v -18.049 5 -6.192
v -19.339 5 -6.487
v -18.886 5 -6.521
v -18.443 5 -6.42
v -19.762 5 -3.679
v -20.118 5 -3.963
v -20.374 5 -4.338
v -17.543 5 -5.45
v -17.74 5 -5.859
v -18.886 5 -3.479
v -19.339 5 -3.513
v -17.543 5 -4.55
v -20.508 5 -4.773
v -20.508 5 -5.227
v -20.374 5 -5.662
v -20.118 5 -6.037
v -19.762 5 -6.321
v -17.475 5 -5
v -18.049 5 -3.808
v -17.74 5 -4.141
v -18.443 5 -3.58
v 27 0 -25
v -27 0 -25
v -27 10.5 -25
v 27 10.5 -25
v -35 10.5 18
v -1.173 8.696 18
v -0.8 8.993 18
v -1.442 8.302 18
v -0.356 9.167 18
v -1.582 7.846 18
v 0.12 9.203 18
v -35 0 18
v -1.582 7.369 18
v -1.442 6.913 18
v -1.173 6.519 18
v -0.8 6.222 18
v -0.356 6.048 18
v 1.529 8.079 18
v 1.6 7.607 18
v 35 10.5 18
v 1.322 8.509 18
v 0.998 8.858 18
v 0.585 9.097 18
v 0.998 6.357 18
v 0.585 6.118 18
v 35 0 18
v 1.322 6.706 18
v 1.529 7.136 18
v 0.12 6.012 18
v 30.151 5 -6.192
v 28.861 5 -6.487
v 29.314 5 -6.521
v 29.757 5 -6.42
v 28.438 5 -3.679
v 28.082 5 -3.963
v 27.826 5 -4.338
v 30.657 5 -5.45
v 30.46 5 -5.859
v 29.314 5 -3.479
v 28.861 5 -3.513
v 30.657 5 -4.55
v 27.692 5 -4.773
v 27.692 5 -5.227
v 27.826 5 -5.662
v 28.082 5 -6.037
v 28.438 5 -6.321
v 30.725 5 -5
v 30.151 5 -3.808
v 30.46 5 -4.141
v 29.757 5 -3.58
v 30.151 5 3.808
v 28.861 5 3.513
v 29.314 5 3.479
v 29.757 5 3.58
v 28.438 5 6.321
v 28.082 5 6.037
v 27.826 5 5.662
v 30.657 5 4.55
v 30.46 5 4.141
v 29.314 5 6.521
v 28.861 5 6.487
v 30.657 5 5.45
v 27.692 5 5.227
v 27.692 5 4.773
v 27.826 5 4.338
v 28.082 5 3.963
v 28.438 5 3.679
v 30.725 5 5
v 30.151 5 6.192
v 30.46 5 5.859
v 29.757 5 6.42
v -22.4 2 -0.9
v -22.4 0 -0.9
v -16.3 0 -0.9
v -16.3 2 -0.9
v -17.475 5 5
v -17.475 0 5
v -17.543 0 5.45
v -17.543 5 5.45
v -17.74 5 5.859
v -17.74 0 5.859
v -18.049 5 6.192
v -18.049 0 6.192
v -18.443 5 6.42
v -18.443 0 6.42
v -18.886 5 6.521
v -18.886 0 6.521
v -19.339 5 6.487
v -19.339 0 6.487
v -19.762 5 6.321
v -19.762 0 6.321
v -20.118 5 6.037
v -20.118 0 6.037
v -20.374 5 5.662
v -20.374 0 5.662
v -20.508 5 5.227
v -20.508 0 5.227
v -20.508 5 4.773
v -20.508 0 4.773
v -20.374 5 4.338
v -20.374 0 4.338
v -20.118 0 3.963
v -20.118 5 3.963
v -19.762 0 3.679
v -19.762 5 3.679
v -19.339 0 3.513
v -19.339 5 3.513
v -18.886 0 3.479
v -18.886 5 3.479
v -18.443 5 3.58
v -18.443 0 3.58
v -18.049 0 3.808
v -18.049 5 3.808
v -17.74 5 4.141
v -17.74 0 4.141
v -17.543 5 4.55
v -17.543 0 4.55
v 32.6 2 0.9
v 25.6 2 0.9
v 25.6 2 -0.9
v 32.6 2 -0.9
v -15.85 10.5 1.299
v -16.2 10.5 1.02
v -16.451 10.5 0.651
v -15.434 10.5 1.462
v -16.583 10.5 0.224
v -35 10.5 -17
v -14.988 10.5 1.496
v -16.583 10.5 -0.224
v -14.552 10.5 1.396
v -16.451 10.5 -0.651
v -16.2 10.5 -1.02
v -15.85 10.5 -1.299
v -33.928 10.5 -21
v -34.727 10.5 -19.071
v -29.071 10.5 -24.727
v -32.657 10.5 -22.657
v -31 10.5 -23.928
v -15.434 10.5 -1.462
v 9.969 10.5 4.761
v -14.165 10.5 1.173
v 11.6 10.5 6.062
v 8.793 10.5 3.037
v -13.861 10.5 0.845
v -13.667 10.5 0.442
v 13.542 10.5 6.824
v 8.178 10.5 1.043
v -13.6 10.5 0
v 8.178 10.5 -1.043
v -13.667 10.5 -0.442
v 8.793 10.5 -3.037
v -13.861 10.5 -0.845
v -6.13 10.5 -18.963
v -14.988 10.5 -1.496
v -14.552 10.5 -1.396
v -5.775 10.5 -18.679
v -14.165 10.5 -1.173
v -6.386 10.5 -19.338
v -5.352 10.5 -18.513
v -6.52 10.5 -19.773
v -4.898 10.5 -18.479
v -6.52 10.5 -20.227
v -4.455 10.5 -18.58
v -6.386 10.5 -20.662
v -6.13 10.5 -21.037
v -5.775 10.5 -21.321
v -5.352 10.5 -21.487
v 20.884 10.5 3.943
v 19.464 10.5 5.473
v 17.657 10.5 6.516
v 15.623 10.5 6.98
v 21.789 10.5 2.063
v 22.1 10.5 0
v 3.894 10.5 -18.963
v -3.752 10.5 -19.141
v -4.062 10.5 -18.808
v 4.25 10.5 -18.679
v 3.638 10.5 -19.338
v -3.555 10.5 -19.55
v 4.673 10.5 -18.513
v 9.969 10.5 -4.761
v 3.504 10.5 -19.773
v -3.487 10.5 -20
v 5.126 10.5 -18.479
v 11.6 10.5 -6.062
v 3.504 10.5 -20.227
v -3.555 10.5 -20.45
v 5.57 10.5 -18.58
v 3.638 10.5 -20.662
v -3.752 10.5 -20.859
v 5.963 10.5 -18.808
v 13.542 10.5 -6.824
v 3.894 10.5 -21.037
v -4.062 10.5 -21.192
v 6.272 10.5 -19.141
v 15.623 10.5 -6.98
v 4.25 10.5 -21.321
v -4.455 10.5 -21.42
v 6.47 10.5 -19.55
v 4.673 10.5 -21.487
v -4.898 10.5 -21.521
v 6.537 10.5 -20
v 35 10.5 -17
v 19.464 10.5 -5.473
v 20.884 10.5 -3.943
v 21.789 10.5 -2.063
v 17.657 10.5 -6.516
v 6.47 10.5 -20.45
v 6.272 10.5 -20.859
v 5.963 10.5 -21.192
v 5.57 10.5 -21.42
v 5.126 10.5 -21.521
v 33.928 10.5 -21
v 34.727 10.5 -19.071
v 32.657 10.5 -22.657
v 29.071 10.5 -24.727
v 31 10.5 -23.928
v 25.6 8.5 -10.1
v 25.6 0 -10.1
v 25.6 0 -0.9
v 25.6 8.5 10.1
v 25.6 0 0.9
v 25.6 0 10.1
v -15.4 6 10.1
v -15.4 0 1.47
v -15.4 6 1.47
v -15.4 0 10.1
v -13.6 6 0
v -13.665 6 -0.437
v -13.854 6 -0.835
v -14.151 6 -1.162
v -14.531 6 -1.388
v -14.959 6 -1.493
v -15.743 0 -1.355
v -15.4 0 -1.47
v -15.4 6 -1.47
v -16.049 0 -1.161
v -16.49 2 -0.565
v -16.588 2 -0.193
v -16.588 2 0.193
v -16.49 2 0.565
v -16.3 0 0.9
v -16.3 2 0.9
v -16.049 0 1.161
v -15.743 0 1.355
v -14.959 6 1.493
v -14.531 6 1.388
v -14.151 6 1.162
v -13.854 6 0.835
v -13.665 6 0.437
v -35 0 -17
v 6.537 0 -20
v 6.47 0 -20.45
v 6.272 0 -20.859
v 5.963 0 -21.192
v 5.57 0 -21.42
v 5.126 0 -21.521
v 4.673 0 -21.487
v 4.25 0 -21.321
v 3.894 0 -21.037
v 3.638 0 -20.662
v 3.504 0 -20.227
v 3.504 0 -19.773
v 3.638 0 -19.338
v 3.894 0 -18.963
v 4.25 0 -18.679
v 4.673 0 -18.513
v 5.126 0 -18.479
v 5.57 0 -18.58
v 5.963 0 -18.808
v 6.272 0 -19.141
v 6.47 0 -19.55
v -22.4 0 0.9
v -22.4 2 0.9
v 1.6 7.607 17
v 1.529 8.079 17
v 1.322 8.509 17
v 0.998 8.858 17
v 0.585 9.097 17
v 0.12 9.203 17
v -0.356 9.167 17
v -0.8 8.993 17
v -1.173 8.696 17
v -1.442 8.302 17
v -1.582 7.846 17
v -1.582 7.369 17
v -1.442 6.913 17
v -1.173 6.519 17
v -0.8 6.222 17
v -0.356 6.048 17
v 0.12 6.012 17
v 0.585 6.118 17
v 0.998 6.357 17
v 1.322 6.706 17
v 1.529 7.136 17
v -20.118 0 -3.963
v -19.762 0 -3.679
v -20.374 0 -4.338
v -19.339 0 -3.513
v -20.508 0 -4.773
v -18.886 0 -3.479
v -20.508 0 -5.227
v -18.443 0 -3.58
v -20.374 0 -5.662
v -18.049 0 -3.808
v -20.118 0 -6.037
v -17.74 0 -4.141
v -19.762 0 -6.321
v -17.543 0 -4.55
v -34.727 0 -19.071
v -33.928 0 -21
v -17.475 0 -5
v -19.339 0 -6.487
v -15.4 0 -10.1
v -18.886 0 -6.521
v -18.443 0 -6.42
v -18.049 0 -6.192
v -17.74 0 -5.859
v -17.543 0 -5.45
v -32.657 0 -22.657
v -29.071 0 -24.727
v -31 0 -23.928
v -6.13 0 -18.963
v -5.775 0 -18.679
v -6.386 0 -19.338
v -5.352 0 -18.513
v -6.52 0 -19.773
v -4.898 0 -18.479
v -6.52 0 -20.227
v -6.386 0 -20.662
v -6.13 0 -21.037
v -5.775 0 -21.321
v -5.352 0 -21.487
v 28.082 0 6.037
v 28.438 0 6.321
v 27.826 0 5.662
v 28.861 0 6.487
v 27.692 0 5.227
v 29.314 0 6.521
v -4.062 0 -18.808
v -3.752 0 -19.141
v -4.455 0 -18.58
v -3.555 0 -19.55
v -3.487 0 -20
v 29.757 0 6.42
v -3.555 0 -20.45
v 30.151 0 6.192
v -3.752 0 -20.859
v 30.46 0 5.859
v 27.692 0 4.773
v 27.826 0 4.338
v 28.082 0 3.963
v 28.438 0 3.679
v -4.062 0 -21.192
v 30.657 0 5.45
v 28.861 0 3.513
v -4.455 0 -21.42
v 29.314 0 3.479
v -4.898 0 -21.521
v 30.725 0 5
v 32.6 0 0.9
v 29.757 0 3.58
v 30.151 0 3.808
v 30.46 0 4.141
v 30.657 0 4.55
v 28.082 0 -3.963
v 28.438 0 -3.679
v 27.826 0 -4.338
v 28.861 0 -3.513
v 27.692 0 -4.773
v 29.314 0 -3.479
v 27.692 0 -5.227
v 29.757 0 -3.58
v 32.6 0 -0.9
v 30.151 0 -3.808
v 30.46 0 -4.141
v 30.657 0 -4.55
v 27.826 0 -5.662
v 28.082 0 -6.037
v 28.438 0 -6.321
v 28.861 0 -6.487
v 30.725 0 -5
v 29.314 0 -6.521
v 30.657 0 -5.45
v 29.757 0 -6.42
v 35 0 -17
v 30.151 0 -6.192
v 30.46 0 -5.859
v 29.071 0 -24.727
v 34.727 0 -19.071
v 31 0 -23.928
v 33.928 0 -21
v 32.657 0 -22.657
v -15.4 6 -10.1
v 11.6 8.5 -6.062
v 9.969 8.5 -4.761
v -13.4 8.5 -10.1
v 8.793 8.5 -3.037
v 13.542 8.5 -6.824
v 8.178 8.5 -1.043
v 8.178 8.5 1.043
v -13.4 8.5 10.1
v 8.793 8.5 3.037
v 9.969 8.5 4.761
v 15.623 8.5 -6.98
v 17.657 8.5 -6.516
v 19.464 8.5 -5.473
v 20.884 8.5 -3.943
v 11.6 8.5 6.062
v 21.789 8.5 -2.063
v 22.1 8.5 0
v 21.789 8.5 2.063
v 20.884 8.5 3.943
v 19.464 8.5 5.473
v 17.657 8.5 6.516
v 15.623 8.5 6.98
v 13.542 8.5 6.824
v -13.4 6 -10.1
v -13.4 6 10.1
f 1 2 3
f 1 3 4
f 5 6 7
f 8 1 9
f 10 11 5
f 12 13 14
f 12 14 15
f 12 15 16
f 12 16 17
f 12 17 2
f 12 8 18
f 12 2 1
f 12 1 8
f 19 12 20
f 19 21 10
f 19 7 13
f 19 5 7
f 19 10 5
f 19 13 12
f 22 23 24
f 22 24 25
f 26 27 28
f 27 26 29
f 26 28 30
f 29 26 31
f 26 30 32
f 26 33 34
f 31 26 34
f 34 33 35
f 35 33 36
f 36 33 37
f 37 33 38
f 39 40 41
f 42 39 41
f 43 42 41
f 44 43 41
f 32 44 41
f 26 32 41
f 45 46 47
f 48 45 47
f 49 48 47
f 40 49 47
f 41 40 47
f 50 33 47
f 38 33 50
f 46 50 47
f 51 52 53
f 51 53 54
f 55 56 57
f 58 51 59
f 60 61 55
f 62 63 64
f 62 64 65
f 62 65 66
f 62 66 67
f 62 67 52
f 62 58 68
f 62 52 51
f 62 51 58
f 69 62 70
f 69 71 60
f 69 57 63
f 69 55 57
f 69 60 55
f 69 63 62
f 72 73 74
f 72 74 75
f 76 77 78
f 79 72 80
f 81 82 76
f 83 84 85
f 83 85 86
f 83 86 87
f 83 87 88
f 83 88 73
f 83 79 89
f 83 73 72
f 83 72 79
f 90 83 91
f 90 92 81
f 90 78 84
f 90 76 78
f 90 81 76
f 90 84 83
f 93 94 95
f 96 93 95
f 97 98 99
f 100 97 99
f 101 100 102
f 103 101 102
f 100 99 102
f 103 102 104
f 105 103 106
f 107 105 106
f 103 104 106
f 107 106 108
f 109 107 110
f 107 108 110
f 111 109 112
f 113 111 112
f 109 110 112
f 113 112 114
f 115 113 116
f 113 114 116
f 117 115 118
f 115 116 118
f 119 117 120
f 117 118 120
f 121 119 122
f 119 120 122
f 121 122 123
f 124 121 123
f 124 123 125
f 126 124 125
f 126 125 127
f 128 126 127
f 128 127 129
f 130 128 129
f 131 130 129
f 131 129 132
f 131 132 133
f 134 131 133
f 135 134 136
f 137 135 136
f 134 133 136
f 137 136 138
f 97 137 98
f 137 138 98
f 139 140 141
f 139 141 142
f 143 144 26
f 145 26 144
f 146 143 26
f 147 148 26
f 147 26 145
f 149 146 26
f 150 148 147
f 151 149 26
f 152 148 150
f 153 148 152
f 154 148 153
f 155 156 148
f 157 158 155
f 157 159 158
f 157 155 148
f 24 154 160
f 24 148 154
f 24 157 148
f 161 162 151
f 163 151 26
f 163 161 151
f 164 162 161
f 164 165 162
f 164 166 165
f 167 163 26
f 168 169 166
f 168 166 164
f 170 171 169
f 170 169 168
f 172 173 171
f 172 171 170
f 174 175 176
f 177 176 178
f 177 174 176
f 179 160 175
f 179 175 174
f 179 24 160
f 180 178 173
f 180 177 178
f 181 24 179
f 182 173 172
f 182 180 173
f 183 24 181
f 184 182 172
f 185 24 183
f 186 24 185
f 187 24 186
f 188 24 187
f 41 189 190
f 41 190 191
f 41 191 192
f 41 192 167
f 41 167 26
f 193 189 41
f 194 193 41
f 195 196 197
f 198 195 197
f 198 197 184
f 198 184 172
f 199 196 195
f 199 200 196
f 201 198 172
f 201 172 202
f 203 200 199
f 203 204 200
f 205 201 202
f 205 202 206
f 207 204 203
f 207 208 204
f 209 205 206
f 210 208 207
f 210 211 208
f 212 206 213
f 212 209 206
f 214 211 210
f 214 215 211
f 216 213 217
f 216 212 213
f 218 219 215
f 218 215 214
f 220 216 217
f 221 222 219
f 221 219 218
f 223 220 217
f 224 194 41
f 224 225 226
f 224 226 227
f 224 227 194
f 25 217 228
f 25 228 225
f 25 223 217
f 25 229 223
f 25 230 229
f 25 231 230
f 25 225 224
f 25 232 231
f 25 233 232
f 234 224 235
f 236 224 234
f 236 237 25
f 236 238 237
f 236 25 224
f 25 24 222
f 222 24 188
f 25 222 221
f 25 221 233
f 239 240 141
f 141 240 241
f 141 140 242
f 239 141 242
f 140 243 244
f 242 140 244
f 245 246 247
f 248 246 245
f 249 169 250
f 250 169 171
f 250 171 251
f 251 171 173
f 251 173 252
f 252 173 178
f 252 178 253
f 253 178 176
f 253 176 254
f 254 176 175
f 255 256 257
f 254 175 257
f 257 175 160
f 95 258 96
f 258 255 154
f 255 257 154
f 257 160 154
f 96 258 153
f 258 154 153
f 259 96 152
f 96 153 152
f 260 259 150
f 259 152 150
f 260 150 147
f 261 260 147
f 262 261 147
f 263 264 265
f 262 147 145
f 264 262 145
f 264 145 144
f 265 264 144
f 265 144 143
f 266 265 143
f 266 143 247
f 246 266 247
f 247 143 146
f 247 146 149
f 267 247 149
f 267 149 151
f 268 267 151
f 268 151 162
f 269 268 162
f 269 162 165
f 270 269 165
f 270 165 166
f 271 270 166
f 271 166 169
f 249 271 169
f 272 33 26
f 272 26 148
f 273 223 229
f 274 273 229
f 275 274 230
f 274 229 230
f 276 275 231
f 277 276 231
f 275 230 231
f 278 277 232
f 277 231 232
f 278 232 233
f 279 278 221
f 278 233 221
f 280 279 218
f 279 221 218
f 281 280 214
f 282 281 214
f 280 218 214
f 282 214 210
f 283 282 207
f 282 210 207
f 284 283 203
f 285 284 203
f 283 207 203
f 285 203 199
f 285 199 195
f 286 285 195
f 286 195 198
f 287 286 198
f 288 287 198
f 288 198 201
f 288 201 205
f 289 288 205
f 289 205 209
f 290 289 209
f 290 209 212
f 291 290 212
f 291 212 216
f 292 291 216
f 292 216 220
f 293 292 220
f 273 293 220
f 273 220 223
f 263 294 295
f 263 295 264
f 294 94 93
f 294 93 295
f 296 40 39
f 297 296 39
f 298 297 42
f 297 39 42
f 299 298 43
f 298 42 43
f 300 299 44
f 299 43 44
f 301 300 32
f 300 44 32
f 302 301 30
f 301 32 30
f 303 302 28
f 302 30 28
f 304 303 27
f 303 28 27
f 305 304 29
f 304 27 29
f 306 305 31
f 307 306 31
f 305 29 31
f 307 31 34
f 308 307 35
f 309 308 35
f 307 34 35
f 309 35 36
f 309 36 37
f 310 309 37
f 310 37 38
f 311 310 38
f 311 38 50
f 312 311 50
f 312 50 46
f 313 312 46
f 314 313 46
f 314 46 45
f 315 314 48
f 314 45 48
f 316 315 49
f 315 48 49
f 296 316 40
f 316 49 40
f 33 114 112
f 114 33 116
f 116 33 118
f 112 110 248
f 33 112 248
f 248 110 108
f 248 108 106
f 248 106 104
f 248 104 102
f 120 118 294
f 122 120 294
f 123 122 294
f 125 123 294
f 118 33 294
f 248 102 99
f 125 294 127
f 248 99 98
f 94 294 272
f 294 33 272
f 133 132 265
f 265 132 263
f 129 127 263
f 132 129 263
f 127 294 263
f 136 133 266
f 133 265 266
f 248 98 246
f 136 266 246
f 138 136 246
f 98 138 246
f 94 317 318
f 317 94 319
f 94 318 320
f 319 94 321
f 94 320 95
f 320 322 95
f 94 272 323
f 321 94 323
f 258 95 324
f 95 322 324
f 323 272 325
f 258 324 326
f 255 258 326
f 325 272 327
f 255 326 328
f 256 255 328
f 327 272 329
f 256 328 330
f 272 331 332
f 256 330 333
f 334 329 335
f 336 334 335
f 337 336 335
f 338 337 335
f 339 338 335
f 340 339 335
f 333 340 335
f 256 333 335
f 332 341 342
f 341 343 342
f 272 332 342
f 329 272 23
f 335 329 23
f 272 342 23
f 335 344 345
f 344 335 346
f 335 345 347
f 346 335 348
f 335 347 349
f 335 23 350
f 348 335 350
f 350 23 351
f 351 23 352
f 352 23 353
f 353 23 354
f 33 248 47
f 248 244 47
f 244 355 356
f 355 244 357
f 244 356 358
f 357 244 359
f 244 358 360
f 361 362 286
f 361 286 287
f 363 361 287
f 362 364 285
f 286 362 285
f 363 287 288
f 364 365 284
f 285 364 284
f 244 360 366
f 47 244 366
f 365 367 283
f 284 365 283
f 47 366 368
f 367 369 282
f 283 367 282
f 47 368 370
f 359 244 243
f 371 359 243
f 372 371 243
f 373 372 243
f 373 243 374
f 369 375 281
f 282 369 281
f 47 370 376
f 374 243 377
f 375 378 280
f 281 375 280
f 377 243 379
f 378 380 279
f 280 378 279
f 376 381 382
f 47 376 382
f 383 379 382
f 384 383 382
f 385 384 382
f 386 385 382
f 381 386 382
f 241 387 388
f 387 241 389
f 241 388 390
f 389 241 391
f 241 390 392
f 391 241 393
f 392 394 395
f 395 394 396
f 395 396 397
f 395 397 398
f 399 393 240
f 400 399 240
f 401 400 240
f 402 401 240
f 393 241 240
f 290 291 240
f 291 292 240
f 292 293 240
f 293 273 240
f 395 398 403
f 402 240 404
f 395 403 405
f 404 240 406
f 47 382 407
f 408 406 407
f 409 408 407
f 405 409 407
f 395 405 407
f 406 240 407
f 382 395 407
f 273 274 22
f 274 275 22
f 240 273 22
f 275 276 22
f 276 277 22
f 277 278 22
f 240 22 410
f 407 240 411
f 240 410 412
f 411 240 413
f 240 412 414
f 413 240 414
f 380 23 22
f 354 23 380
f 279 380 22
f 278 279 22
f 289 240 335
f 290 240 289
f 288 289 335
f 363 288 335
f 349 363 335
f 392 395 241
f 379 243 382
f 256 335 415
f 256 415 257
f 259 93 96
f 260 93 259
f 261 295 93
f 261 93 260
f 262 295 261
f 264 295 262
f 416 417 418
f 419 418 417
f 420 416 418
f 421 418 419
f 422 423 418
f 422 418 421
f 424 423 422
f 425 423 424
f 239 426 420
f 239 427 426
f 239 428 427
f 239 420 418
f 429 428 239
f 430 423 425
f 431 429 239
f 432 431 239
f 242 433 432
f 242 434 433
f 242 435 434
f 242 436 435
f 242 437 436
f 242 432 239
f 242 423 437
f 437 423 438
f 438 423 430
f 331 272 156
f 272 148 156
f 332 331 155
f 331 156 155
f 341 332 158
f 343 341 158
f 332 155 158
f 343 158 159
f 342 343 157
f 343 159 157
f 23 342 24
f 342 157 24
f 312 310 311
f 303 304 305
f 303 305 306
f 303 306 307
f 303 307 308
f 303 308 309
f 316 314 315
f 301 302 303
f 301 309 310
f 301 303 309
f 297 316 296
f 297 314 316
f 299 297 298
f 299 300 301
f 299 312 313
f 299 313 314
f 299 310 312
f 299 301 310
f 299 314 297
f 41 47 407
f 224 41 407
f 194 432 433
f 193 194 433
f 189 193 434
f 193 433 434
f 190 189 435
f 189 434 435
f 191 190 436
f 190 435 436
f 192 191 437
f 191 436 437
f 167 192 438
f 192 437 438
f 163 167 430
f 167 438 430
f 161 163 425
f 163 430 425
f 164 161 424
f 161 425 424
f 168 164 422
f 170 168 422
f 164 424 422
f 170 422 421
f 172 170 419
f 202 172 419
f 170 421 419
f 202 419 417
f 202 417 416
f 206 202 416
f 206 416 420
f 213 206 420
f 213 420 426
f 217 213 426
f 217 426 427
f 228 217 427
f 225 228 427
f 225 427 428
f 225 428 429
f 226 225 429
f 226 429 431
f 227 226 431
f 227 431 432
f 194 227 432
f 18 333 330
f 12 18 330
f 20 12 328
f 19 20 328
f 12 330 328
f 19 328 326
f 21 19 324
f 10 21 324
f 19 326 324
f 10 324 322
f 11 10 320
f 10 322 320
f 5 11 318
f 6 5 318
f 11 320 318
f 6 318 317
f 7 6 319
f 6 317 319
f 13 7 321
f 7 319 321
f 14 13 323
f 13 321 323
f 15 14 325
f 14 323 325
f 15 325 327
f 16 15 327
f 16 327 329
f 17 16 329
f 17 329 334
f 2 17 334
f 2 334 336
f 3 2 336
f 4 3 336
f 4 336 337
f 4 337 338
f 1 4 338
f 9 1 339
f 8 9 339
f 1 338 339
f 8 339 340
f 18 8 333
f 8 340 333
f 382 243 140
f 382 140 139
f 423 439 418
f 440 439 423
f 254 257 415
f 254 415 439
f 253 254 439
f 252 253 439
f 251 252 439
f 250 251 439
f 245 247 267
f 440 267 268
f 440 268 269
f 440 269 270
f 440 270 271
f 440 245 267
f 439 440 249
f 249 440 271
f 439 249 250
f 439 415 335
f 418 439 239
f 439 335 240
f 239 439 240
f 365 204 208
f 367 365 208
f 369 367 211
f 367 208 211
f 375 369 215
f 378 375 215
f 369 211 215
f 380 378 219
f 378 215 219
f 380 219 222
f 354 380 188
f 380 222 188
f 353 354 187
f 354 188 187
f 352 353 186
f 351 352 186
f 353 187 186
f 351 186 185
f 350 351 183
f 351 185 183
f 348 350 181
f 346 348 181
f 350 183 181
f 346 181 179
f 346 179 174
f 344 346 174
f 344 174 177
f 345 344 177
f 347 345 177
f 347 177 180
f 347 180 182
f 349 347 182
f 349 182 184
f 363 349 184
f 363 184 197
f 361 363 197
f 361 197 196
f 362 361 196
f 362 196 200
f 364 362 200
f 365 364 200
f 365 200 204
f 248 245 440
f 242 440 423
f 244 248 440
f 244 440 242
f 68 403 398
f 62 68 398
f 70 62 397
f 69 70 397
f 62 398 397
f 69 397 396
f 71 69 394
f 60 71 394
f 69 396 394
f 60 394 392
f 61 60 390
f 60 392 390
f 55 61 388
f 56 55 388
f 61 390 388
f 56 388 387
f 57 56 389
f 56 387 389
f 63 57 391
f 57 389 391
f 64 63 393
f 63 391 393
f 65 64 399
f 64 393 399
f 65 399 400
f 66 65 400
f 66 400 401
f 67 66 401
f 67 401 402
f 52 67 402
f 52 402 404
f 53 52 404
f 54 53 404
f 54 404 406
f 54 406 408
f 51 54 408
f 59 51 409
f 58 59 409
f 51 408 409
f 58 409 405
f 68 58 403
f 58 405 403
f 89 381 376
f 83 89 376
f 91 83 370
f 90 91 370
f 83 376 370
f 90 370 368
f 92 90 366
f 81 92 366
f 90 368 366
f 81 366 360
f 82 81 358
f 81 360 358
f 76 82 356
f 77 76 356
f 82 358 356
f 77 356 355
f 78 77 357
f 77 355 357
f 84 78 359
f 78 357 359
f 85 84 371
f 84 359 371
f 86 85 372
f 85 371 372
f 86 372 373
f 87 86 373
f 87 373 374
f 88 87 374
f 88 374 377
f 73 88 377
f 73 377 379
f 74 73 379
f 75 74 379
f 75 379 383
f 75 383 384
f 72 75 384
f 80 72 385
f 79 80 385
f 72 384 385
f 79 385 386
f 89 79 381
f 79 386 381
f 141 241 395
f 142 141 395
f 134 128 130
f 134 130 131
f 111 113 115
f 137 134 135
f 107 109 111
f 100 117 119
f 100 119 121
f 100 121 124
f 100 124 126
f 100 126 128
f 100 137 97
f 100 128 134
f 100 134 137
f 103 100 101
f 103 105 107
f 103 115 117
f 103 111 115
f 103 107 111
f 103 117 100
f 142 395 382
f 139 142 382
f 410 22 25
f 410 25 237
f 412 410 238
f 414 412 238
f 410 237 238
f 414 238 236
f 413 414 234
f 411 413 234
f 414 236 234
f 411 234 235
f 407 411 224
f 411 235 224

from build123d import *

# Parameters (mm, degrees)
SKETCH_1_W          = 70
SKETCH_1_H          = 43
EXTRUDE_1_DEPTH     = 10.5
SKETCH_2_R          = 1.5
CUT_EXTRUDE_1_DEPTH = 15
SKETCH_3_W          = 41
SKETCH_3_H          = 20.2
CUT_EXTRUDE_2_DEPTH = 6
SKETCH_4_R          = 7
CUT_EXTRUDE_3_DEPTH = 8.5
SKETCH_6_W          = 39
SKETCH_6_H          = 20.2
CUT_EXTRUDE_4_DEPTH = 2.5
SKETCH_7_R          = 1.525
CUT_EXTRUDE_5_DEPTH = 5
SKETCH_9_W          = 55
SKETCH_9_H          = 1.8
CUT_EXTRUDE_6_DEPTH = 2
FILLET_1_R          = 8
SKETCH_10_R         = 7
SKETCH_10_R_2       = 1.5
SKETCH_10_R_3       = 1.525
CUT_EXTRUDE_7_DEPTH = 20
SKETCH_11_R         = 1.6
CUT_EXTRUDE_8_DEPTH = 1


with BuildPart() as part:
    # 草图1 → 凸台-拉伸1 (new body)
    with BuildSketch(Plane(origin=(0, 0, 0), x_dir=(1, 0, 0), z_dir=(0, 1, 0))):
        with Locations((0, 3.5)):
            Rectangle(SKETCH_1_W, SKETCH_1_H)
    extrude(amount=EXTRUDE_1_DEPTH)

    # 草图2 → 切除-拉伸1 (cut)
    with BuildSketch(Plane(origin=(0, 10.5, 0), x_dir=(1, 0, 0), z_dir=(0, 1, 0))):
        with Locations((15.1, 0)):
            Circle(SKETCH_2_R)
        with Locations((-15.1, 0)):
            Circle(SKETCH_2_R)
    extrude(amount=-CUT_EXTRUDE_1_DEPTH, mode=Mode.SUBTRACT)

    # 草图3 → 切除-拉伸2 (cut)
    with BuildSketch(Plane.XZ):
        with Locations((5.1, 0)):
            Rectangle(SKETCH_3_W, SKETCH_3_H)
    extrude(amount=-CUT_EXTRUDE_2_DEPTH, mode=Mode.SUBTRACT)

    # 草图4 → 切除-拉伸3 (cut)
    with BuildSketch(Plane.XZ.offset(-6)):
        with Locations((15.1, 0)):
            Circle(SKETCH_4_R)
    extrude(amount=-CUT_EXTRUDE_3_DEPTH, mode=Mode.SUBTRACT)

    # 草图6 → 切除-拉伸4 (cut)
    with BuildSketch(Plane.XZ.offset(-6)):
        with Locations((6.1, 0)):
            Rectangle(SKETCH_6_W, SKETCH_6_H)
    extrude(amount=-CUT_EXTRUDE_4_DEPTH, mode=Mode.SUBTRACT)

    # 草图7 → 切除-拉伸5 (cut)
    with BuildSketch(Plane.XZ):
        with Locations((29.2, 5)):
            Circle(SKETCH_7_R)
        with Locations((29.2, -5)):
            Circle(SKETCH_7_R)
        with Locations((-19, -5)):
            Circle(SKETCH_7_R)
        with Locations((-19, 5)):
            Circle(SKETCH_7_R)
    extrude(amount=-CUT_EXTRUDE_5_DEPTH, mode=Mode.SUBTRACT)

    # 草图9 → 切除-拉伸6 (cut)
    with BuildSketch(Plane.XZ):
        with Locations((5.1, 0)):
            Rectangle(SKETCH_9_W, SKETCH_9_H)
    extrude(amount=-CUT_EXTRUDE_6_DEPTH, mode=Mode.SUBTRACT)

    # 圆角1
    fillet_1_edges = [part.edges().sort_by_distance(p)[0] for p in [
        (-35, 5.25, -25),
        (35, 5.25, -25),
    ]]
    fillet(fillet_1_edges, radius=FILLET_1_R)

    # 草图10 → 切除-拉伸7 (cut)
    with BuildSketch(Plane(origin=(0, 10.5, 0), x_dir=(1, 0, 0), z_dir=(0, 1, 0))):
        with Locations((15.1, 0)):
            Circle(SKETCH_10_R)
        with Locations((-15.1, 0)):
            Circle(SKETCH_10_R_2)
        with Locations((-5.01238383, 20)):
            Circle(SKETCH_10_R_3)
        with Locations((5.01238383, 20)):
            Circle(SKETCH_10_R_3)
    extrude(amount=-CUT_EXTRUDE_7_DEPTH, mode=Mode.SUBTRACT)

    # 草图11 → 切除-拉伸8 (cut)
    with BuildSketch(Plane.XY.offset(18)):
        with Locations((0, 7.607443484)):
            Circle(SKETCH_11_R)
    extrude(amount=-CUT_EXTRUDE_8_DEPTH, mode=Mode.SUBTRACT)


solid = part.part
